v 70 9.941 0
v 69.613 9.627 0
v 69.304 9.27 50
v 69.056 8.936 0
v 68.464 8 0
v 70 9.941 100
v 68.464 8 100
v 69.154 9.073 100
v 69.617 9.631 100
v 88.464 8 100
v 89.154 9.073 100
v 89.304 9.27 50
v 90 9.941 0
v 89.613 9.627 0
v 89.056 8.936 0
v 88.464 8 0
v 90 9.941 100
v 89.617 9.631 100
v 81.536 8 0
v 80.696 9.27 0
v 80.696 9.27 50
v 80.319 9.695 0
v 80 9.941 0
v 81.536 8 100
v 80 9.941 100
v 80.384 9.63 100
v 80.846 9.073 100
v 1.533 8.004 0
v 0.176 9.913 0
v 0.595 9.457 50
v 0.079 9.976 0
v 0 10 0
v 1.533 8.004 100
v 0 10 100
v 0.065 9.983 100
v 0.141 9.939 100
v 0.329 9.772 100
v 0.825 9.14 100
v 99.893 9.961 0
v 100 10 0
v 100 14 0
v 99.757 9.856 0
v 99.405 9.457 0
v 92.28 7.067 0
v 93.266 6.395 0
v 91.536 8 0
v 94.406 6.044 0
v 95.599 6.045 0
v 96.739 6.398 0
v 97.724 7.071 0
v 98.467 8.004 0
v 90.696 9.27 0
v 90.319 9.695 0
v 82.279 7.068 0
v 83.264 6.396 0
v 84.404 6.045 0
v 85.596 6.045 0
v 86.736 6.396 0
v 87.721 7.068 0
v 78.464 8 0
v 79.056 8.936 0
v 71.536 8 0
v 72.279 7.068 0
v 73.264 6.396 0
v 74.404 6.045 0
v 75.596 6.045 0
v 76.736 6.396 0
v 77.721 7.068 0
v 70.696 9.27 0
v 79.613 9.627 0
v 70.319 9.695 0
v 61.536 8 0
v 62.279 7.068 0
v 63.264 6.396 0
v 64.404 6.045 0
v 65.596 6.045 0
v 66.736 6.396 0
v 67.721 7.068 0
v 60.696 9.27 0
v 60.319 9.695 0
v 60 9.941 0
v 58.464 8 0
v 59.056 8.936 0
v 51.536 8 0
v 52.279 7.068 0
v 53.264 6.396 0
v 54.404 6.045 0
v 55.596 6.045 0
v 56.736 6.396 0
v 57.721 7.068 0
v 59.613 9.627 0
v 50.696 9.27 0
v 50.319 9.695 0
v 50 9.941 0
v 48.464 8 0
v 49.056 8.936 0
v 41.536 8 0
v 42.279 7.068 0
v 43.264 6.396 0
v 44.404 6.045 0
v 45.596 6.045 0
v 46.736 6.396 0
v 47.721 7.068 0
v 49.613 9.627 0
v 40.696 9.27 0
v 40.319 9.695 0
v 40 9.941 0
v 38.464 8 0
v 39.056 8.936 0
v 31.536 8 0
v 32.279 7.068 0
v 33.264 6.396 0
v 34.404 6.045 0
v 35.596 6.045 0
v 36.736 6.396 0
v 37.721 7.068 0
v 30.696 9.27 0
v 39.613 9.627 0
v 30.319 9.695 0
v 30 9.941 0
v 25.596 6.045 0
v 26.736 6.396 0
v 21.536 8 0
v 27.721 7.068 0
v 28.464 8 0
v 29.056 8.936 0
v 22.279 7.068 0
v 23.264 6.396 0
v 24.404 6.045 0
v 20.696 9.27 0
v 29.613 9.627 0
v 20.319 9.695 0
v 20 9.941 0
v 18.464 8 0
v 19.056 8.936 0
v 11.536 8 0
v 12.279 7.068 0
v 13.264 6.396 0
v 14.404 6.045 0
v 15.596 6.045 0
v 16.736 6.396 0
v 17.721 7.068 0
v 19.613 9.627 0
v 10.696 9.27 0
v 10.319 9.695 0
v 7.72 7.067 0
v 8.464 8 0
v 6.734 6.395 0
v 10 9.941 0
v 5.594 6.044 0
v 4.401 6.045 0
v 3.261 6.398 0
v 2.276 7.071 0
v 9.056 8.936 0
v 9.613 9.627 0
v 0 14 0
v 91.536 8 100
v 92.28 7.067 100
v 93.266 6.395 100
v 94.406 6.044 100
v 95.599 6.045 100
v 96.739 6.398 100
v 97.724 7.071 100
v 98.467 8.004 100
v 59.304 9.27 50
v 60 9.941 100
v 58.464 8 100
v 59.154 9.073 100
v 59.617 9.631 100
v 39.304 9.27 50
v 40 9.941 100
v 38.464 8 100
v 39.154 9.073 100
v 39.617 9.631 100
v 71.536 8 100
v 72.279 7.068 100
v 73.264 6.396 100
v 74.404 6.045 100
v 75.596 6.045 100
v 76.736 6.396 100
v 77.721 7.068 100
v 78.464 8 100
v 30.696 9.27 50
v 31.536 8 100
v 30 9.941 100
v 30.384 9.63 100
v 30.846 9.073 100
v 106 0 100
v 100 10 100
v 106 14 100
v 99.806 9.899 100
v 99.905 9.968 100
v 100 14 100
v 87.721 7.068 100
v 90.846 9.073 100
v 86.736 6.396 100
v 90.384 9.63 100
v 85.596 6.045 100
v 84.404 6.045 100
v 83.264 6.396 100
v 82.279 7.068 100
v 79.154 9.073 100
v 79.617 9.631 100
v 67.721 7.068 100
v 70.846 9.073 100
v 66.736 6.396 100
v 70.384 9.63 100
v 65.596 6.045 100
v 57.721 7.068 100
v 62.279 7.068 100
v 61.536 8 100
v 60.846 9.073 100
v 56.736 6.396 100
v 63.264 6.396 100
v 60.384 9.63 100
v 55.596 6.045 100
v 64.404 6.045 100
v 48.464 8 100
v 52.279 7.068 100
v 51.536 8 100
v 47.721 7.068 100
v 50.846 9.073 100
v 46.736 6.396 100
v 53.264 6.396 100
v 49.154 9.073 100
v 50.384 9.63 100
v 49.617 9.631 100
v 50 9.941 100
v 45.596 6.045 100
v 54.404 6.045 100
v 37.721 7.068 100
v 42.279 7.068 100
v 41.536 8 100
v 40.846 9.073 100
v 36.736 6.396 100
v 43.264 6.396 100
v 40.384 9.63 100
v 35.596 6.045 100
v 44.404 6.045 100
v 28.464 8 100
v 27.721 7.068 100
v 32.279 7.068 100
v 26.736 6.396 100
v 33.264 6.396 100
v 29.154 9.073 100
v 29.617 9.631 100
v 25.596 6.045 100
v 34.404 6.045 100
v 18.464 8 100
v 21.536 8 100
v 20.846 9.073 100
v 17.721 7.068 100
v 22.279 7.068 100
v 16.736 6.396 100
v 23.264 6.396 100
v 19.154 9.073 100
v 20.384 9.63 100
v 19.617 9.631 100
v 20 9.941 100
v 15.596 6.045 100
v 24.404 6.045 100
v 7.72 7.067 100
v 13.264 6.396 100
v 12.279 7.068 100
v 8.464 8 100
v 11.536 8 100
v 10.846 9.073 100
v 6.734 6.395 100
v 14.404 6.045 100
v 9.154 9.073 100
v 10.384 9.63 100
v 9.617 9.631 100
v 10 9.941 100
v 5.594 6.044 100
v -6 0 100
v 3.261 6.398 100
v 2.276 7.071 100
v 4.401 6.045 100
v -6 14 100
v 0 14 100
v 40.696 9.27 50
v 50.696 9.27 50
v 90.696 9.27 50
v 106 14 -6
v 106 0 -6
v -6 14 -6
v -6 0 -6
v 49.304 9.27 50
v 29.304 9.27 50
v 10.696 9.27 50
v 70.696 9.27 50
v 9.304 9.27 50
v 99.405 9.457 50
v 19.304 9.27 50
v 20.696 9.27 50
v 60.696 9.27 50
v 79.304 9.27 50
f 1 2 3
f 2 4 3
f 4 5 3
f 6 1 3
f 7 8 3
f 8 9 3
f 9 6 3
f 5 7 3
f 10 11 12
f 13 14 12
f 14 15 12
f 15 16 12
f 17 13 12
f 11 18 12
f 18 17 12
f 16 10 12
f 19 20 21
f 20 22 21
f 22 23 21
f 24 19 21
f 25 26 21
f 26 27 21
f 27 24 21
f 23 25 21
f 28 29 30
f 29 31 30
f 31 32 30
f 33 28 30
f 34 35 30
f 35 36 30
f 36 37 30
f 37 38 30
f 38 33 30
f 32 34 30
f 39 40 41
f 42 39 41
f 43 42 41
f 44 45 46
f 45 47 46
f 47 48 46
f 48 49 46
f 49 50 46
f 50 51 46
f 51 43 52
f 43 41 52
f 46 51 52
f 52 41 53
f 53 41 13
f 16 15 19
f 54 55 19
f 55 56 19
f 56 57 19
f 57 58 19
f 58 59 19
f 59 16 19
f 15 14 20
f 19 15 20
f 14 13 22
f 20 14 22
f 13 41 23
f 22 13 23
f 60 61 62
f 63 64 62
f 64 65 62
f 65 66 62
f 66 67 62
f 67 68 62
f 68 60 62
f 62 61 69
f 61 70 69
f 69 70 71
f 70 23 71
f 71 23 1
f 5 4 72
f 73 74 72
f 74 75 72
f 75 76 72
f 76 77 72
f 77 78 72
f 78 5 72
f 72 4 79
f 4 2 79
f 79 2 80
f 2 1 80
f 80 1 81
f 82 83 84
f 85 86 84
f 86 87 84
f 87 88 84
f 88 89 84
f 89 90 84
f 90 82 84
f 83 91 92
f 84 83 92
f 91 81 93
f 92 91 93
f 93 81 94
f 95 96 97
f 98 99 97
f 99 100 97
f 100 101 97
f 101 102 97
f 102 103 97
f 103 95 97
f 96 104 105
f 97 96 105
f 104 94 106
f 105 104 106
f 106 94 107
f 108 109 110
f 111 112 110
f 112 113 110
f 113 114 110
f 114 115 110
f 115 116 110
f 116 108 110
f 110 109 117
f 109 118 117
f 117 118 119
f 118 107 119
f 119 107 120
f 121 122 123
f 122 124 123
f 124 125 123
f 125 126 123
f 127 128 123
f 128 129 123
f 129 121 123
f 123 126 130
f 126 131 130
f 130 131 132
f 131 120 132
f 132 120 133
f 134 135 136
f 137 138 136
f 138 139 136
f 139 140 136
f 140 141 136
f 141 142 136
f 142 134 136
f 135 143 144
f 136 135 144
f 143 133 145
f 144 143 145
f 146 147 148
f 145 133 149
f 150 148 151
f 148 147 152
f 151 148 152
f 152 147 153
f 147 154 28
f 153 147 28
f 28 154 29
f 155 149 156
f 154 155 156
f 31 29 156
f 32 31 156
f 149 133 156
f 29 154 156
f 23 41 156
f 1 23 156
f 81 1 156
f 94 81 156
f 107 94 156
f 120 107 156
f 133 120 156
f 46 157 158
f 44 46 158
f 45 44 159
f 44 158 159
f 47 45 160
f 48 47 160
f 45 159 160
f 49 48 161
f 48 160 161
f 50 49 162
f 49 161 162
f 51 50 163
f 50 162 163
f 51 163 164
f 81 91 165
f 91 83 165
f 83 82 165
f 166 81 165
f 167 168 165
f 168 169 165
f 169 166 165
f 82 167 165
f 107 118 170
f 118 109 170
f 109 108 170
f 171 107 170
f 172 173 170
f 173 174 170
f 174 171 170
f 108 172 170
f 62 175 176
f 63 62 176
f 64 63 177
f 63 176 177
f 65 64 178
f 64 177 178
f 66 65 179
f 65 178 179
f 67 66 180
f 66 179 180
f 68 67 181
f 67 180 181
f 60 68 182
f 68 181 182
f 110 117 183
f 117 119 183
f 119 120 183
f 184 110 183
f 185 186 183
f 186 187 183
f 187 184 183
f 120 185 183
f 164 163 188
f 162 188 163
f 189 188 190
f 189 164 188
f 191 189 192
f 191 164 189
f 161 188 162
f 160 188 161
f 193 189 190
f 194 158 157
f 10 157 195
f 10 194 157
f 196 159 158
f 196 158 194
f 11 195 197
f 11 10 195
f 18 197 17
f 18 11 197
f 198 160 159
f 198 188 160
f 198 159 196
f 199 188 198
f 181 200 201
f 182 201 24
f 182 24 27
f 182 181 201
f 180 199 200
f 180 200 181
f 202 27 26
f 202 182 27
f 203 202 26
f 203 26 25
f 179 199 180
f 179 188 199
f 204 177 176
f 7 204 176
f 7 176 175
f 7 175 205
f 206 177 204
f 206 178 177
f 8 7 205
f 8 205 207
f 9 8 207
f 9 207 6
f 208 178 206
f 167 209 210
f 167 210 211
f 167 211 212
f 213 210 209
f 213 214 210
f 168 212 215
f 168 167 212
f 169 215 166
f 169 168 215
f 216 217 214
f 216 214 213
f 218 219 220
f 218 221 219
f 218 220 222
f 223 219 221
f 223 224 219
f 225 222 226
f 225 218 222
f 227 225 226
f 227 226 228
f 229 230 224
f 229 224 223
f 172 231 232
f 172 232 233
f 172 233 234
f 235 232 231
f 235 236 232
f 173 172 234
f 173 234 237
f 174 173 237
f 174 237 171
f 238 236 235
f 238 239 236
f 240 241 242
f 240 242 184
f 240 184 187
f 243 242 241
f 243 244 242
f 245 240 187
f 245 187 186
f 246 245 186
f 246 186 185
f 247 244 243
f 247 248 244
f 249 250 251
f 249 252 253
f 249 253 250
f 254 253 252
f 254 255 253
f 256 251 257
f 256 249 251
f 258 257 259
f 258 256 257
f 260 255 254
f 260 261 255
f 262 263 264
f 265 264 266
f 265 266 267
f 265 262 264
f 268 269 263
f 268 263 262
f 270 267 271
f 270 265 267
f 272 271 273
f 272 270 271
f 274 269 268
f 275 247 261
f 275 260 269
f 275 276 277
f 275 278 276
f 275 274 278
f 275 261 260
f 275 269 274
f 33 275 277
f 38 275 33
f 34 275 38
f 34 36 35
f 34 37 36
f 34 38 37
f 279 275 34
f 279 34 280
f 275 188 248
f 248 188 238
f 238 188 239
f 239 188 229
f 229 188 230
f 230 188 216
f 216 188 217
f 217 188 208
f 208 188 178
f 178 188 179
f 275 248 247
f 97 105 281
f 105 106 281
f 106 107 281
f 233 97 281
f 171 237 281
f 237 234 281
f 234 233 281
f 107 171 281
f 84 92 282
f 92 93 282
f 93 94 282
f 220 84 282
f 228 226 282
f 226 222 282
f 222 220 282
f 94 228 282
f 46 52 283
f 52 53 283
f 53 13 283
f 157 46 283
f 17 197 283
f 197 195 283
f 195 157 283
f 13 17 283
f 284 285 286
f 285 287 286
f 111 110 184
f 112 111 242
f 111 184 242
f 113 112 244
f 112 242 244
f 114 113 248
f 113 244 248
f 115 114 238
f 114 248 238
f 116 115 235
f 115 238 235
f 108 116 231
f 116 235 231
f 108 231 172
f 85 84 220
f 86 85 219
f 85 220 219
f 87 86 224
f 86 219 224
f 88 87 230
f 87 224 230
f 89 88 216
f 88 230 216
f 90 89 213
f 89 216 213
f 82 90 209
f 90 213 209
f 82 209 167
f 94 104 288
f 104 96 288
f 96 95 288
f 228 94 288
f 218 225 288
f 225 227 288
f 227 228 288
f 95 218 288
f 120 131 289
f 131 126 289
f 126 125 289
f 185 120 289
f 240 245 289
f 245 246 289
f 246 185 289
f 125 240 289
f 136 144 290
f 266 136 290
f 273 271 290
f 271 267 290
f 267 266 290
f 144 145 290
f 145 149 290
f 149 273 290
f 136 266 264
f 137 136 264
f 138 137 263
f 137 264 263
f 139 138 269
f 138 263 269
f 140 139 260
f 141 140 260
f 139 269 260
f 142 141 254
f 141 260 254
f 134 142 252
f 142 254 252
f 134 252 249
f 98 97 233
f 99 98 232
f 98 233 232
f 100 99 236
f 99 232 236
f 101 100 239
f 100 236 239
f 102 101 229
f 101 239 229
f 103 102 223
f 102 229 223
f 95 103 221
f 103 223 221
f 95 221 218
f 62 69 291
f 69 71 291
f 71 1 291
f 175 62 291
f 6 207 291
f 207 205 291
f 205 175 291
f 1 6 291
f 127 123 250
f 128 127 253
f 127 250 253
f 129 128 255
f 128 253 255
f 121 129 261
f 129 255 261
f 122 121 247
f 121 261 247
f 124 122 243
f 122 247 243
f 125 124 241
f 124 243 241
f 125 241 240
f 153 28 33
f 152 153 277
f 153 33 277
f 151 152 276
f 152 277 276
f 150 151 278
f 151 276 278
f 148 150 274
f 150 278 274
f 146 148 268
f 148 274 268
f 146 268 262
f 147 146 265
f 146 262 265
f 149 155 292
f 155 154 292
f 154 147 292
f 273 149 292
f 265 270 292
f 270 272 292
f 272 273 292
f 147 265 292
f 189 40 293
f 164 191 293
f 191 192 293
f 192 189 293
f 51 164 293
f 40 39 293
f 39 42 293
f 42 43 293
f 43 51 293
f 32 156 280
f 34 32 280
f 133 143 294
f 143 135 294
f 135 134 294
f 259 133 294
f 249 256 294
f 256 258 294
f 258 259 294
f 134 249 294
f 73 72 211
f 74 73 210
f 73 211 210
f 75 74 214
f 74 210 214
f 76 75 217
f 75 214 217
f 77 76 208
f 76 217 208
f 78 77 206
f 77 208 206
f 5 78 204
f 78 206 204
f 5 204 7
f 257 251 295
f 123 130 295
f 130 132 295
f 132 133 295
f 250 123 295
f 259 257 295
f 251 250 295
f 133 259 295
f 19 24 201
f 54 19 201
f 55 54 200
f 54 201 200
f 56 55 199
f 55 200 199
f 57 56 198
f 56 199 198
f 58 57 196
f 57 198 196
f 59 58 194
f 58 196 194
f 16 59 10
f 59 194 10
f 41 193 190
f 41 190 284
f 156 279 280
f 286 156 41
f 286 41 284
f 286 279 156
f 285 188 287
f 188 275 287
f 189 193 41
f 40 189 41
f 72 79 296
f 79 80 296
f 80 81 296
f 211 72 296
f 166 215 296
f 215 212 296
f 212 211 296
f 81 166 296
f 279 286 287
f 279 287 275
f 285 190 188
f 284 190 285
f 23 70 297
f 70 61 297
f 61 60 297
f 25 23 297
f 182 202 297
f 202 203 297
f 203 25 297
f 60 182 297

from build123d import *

# Parameters (mm, degrees)
SKETCH1_W           = 100
SKETCH1_H           = 100
BOSS_EXTRUDE1_DEPTH = 10
SKETCH2_W           = 100
SKETCH2_H           = 14
BOSS_EXTRUDE2_DEPTH = 6
SKETCH3_R           = 4
CUT_EXTRUDE1_DEPTH  = 100
FILLET1_DEPTH       = 101
SKETCH4_W           = 106
SKETCH4_H           = 14
BOSS_EXTRUDE3_DEPTH = 6
SKETCH5_W           = 106
SKETCH5_H           = 14
BOSS_EXTRUDE4_DEPTH = 6


with BuildPart() as part:
    # Sketch1 → Boss-Extrude1 (new body)
    with BuildSketch(Plane(origin=(0, 0, 0), x_dir=(1, 0, 0), z_dir=(0, 1, 0))):
        with Locations((50, -50)):
            Rectangle(SKETCH1_W, SKETCH1_H)
    extrude(amount=BOSS_EXTRUDE1_DEPTH)

    # Sketch2 → Boss-Extrude2 (add)
    with BuildSketch(Plane(origin=(0, 0, 0), x_dir=(-1, 0, 0), z_dir=(0, 0, -1))):
        with Locations((-50, 7)):
            Rectangle(SKETCH2_W, SKETCH2_H)
    extrude(amount=BOSS_EXTRUDE2_DEPTH)

    # Sketch3 → Cut-Extrude1 (cut)
    with BuildSketch(Plane.XY.offset(100)):
        with Locations((5, 10)):
            Circle(SKETCH3_R)
        with Locations((15, 10)):
            Circle(SKETCH3_R)
        with Locations((25, 10)):
            Circle(SKETCH3_R)
        with Locations((35, 10)):
            Circle(SKETCH3_R)
        with Locations((45, 10)):
            Circle(SKETCH3_R)
        with Locations((55, 10)):
            Circle(SKETCH3_R)
        with Locations((65, 10)):
            Circle(SKETCH3_R)
        with Locations((75, 10)):
            Circle(SKETCH3_R)
        with Locations((85, 10)):
            Circle(SKETCH3_R)
        with Locations((95, 10)):
            Circle(SKETCH3_R)
    extrude(amount=-CUT_EXTRUDE1_DEPTH, mode=Mode.SUBTRACT)

    # Fillet1: read off the stored shape, not the designer's step
    # Fillet1 outline → Fillet1 (cut)
    with BuildSketch(Plane.XY):
        with BuildLine():
            add(Edge.make_bspline(
                [(1.533333333, 8.004449394), (0.4, 9.973273876), (0, 10)],
                knots=[0, 0, 0, 1, 1, 1], degree=2, weights=[1, 0.881917104, 1]))
            ThreePointArc((1.533333333, 8.004449394), (1.135632868, 8.967204441), (1, 10))
            Line((1, 10), (0, 10))
        make_face()
        with BuildLine():
            add(Edge.make_bspline(
                [(11.535898385, 8), (10.599666447, 9.621601285), (9.99999988, 9.941275628)],
                knots=[0, 0, 0, 0.831887243, 0.831887243, 0.831887243], degree=2, weights=[1, 0.888548242, 0.962527076]))
            ThreePointArc((11.535898385, 8), (11.136296695, 8.96472382), (11, 10))
            Line((11, 10), (9, 10))
            ThreePointArc((9, 10), (8.863703305, 8.96472382), (8.464101615, 8))
            add(Edge.make_bspline(
                [(9.99999988, 9.941275628), (9.400396177, 9.621709752), (8.464101615, 8)],
                knots=[0.168063315, 0.168063315, 0.168063315, 1, 1, 1], degree=2, weights=[0.96253587, 0.888541618, 1]))
        make_face()
        with BuildLine():
            add(Edge.make_bspline(
                [(21.535898385, 8), (20.599666447, 9.621601285), (19.99999988, 9.941275628)],
                knots=[0, 0, 0, 0.831887243, 0.831887243, 0.831887243], degree=2, weights=[1, 0.888548242, 0.962527076]))
            ThreePointArc((21.535898385, 8), (21.136296695, 8.96472382), (21, 10))
            Line((21, 10), (19, 10))
            ThreePointArc((19, 10), (18.863703305, 8.96472382), (18.464101615, 8))
            add(Edge.make_bspline(
                [(19.99999988, 9.941275628), (19.400396177, 9.621709752), (18.464101615, 8)],
                knots=[0.168063315, 0.168063315, 0.168063315, 1, 1, 1], degree=2, weights=[0.96253587, 0.888541618, 1]))
        make_face()
        with BuildLine():
            add(Edge.make_bspline(
                [(31.535898385, 8), (30.599666447, 9.621601285), (29.99999988, 9.941275628)],
                knots=[0, 0, 0, 0.831887243, 0.831887243, 0.831887243], degree=2, weights=[1, 0.888548242, 0.962527076]))
            ThreePointArc((31.535898385, 8), (31.136296695, 8.96472382), (31, 10))
            Line((31, 10), (29, 10))
            ThreePointArc((29, 10), (28.863703305, 8.96472382), (28.464101615, 8))
            add(Edge.make_bspline(
                [(29.99999988, 9.941275628), (29.400396177, 9.621709752), (28.464101615, 8)],
                knots=[0.168063315, 0.168063315, 0.168063315, 1, 1, 1], degree=2, weights=[0.96253587, 0.888541618, 1]))
        make_face()
        with BuildLine():
            add(Edge.make_bspline(
                [(41.535898385, 8), (40.599666447, 9.621601285), (39.99999988, 9.941275628)],
                knots=[0, 0, 0, 0.831887243, 0.831887243, 0.831887243], degree=2, weights=[1, 0.888548242, 0.962527076]))
            ThreePointArc((41.535898385, 8), (41.136296695, 8.96472382), (41, 10))
            Line((41, 10), (39, 10))
            ThreePointArc((39, 10), (38.863703305, 8.96472382), (38.464101615, 8))
            add(Edge.make_bspline(
                [(39.99999988, 9.941275628), (39.400396177, 9.621709752), (38.464101615, 8)],
                knots=[0.168063315, 0.168063315, 0.168063315, 1, 1, 1], degree=2, weights=[0.96253587, 0.888541618, 1]))
        make_face()
        with BuildLine():
            add(Edge.make_bspline(
                [(51.535898385, 8), (50.599666447, 9.621601285), (49.99999988, 9.941275628)],
                knots=[0, 0, 0, 0.831887243, 0.831887243, 0.831887243], degree=2, weights=[1, 0.888548242, 0.962527076]))
            ThreePointArc((51.535898385, 8), (51.136296695, 8.96472382), (51, 10))
            Line((51, 10), (49, 10))
            ThreePointArc((49, 10), (48.863703305, 8.96472382), (48.464101615, 8))
            add(Edge.make_bspline(
                [(49.99999988, 9.941275628), (49.400396177, 9.621709752), (48.464101615, 8)],
                knots=[0.168063315, 0.168063315, 0.168063315, 1, 1, 1], degree=2, weights=[0.96253587, 0.888541618, 1]))
        make_face()
        with BuildLine():
            add(Edge.make_bspline(
                [(61.535898385, 8), (60.599666447, 9.621601285), (59.99999988, 9.941275628)],
                knots=[0, 0, 0, 0.831887243, 0.831887243, 0.831887243], degree=2, weights=[1, 0.888548242, 0.962527076]))
            ThreePointArc((61.535898385, 8), (61.136296695, 8.96472382), (61, 10))
            Line((61, 10), (59, 10))
            ThreePointArc((59, 10), (58.863703305, 8.96472382), (58.464101615, 8))
            add(Edge.make_bspline(
                [(59.99999988, 9.941275628), (59.400396177, 9.621709752), (58.464101615, 8)],
                knots=[0.168063315, 0.168063315, 0.168063315, 1, 1, 1], degree=2, weights=[0.96253587, 0.888541618, 1]))
        make_face()
        with BuildLine():
            add(Edge.make_bspline(
                [(71.535898385, 8), (70.599666447, 9.621601285), (69.99999988, 9.941275628)],
                knots=[0, 0, 0, 0.831887243, 0.831887243, 0.831887243], degree=2, weights=[1, 0.888548242, 0.962527076]))
            ThreePointArc((71.535898385, 8), (71.136296695, 8.96472382), (71, 10))
            Line((71, 10), (69, 10))
            ThreePointArc((69, 10), (68.863703305, 8.96472382), (68.464101615, 8))
            add(Edge.make_bspline(
                [(69.99999988, 9.941275628), (69.400396177, 9.621709752), (68.464101615, 8)],
                knots=[0.168063315, 0.168063315, 0.168063315, 1, 1, 1], degree=2, weights=[0.96253587, 0.888541618, 1]))
        make_face()
        with BuildLine():
            add(Edge.make_bspline(
                [(81.535898385, 8), (80.599666447, 9.621601285), (79.99999988, 9.941275628)],
                knots=[0, 0, 0, 0.831887243, 0.831887243, 0.831887243], degree=2, weights=[1, 0.888548242, 0.962527076]))
            ThreePointArc((81.535898385, 8), (81.136296695, 8.96472382), (81, 10))
            Line((81, 10), (79, 10))
            ThreePointArc((79, 10), (78.863703305, 8.96472382), (78.464101615, 8))
            add(Edge.make_bspline(
                [(79.99999988, 9.941275628), (79.400396177, 9.621709752), (78.464101615, 8)],
                knots=[0.168063315, 0.168063315, 0.168063315, 1, 1, 1], degree=2, weights=[0.96253587, 0.888541618, 1]))
        make_face()
        with BuildLine():
            add(Edge.make_bspline(
                [(91.535898385, 8), (90.599666447, 9.621601285), (89.99999988, 9.941275628)],
                knots=[0, 0, 0, 0.831887243, 0.831887243, 0.831887243], degree=2, weights=[1, 0.888548242, 0.962527076]))
            ThreePointArc((91.535898385, 8), (91.136296695, 8.96472382), (91, 10))
            Line((91, 10), (89, 10))
            ThreePointArc((89, 10), (88.863703305, 8.96472382), (88.464101615, 8))
            add(Edge.make_bspline(
                [(89.99999988, 9.941275628), (89.400396177, 9.621709752), (88.464101615, 8)],
                knots=[0.168063315, 0.168063315, 0.168063315, 1, 1, 1], degree=2, weights=[0.96253587, 0.888541618, 1]))
        make_face()
        with BuildLine():
            add(Edge.make_bspline(
                [(100, 10), (99.6, 9.973273876), (98.466666667, 8.004449394)],
                knots=[0, 0, 0, 1, 1, 1], degree=2, weights=[1, 0.881917104, 1]))
            Line((100, 10), (99, 10))
            ThreePointArc((99, 10), (98.864367132, 8.967204441), (98.466666667, 8.004449394))
        make_face()
    extrude(amount=FILLET1_DEPTH, mode=Mode.SUBTRACT)

    # Sketch4 → Boss-Extrude3 (add)
    with BuildSketch(Plane.ZY):
        with Locations((47, 7)):
            Rectangle(SKETCH4_W, SKETCH4_H)
    extrude(amount=BOSS_EXTRUDE3_DEPTH)

    # Sketch5 → Boss-Extrude4 (add)
    with BuildSketch(Plane(origin=(100, 0, 0), x_dir=(0, 0, -1), z_dir=(1, 0, 0))):
        with Locations((-47, 7)):
            Rectangle(SKETCH5_W, SKETCH5_H)
    extrude(amount=BOSS_EXTRUDE4_DEPTH)


solid = part.part
